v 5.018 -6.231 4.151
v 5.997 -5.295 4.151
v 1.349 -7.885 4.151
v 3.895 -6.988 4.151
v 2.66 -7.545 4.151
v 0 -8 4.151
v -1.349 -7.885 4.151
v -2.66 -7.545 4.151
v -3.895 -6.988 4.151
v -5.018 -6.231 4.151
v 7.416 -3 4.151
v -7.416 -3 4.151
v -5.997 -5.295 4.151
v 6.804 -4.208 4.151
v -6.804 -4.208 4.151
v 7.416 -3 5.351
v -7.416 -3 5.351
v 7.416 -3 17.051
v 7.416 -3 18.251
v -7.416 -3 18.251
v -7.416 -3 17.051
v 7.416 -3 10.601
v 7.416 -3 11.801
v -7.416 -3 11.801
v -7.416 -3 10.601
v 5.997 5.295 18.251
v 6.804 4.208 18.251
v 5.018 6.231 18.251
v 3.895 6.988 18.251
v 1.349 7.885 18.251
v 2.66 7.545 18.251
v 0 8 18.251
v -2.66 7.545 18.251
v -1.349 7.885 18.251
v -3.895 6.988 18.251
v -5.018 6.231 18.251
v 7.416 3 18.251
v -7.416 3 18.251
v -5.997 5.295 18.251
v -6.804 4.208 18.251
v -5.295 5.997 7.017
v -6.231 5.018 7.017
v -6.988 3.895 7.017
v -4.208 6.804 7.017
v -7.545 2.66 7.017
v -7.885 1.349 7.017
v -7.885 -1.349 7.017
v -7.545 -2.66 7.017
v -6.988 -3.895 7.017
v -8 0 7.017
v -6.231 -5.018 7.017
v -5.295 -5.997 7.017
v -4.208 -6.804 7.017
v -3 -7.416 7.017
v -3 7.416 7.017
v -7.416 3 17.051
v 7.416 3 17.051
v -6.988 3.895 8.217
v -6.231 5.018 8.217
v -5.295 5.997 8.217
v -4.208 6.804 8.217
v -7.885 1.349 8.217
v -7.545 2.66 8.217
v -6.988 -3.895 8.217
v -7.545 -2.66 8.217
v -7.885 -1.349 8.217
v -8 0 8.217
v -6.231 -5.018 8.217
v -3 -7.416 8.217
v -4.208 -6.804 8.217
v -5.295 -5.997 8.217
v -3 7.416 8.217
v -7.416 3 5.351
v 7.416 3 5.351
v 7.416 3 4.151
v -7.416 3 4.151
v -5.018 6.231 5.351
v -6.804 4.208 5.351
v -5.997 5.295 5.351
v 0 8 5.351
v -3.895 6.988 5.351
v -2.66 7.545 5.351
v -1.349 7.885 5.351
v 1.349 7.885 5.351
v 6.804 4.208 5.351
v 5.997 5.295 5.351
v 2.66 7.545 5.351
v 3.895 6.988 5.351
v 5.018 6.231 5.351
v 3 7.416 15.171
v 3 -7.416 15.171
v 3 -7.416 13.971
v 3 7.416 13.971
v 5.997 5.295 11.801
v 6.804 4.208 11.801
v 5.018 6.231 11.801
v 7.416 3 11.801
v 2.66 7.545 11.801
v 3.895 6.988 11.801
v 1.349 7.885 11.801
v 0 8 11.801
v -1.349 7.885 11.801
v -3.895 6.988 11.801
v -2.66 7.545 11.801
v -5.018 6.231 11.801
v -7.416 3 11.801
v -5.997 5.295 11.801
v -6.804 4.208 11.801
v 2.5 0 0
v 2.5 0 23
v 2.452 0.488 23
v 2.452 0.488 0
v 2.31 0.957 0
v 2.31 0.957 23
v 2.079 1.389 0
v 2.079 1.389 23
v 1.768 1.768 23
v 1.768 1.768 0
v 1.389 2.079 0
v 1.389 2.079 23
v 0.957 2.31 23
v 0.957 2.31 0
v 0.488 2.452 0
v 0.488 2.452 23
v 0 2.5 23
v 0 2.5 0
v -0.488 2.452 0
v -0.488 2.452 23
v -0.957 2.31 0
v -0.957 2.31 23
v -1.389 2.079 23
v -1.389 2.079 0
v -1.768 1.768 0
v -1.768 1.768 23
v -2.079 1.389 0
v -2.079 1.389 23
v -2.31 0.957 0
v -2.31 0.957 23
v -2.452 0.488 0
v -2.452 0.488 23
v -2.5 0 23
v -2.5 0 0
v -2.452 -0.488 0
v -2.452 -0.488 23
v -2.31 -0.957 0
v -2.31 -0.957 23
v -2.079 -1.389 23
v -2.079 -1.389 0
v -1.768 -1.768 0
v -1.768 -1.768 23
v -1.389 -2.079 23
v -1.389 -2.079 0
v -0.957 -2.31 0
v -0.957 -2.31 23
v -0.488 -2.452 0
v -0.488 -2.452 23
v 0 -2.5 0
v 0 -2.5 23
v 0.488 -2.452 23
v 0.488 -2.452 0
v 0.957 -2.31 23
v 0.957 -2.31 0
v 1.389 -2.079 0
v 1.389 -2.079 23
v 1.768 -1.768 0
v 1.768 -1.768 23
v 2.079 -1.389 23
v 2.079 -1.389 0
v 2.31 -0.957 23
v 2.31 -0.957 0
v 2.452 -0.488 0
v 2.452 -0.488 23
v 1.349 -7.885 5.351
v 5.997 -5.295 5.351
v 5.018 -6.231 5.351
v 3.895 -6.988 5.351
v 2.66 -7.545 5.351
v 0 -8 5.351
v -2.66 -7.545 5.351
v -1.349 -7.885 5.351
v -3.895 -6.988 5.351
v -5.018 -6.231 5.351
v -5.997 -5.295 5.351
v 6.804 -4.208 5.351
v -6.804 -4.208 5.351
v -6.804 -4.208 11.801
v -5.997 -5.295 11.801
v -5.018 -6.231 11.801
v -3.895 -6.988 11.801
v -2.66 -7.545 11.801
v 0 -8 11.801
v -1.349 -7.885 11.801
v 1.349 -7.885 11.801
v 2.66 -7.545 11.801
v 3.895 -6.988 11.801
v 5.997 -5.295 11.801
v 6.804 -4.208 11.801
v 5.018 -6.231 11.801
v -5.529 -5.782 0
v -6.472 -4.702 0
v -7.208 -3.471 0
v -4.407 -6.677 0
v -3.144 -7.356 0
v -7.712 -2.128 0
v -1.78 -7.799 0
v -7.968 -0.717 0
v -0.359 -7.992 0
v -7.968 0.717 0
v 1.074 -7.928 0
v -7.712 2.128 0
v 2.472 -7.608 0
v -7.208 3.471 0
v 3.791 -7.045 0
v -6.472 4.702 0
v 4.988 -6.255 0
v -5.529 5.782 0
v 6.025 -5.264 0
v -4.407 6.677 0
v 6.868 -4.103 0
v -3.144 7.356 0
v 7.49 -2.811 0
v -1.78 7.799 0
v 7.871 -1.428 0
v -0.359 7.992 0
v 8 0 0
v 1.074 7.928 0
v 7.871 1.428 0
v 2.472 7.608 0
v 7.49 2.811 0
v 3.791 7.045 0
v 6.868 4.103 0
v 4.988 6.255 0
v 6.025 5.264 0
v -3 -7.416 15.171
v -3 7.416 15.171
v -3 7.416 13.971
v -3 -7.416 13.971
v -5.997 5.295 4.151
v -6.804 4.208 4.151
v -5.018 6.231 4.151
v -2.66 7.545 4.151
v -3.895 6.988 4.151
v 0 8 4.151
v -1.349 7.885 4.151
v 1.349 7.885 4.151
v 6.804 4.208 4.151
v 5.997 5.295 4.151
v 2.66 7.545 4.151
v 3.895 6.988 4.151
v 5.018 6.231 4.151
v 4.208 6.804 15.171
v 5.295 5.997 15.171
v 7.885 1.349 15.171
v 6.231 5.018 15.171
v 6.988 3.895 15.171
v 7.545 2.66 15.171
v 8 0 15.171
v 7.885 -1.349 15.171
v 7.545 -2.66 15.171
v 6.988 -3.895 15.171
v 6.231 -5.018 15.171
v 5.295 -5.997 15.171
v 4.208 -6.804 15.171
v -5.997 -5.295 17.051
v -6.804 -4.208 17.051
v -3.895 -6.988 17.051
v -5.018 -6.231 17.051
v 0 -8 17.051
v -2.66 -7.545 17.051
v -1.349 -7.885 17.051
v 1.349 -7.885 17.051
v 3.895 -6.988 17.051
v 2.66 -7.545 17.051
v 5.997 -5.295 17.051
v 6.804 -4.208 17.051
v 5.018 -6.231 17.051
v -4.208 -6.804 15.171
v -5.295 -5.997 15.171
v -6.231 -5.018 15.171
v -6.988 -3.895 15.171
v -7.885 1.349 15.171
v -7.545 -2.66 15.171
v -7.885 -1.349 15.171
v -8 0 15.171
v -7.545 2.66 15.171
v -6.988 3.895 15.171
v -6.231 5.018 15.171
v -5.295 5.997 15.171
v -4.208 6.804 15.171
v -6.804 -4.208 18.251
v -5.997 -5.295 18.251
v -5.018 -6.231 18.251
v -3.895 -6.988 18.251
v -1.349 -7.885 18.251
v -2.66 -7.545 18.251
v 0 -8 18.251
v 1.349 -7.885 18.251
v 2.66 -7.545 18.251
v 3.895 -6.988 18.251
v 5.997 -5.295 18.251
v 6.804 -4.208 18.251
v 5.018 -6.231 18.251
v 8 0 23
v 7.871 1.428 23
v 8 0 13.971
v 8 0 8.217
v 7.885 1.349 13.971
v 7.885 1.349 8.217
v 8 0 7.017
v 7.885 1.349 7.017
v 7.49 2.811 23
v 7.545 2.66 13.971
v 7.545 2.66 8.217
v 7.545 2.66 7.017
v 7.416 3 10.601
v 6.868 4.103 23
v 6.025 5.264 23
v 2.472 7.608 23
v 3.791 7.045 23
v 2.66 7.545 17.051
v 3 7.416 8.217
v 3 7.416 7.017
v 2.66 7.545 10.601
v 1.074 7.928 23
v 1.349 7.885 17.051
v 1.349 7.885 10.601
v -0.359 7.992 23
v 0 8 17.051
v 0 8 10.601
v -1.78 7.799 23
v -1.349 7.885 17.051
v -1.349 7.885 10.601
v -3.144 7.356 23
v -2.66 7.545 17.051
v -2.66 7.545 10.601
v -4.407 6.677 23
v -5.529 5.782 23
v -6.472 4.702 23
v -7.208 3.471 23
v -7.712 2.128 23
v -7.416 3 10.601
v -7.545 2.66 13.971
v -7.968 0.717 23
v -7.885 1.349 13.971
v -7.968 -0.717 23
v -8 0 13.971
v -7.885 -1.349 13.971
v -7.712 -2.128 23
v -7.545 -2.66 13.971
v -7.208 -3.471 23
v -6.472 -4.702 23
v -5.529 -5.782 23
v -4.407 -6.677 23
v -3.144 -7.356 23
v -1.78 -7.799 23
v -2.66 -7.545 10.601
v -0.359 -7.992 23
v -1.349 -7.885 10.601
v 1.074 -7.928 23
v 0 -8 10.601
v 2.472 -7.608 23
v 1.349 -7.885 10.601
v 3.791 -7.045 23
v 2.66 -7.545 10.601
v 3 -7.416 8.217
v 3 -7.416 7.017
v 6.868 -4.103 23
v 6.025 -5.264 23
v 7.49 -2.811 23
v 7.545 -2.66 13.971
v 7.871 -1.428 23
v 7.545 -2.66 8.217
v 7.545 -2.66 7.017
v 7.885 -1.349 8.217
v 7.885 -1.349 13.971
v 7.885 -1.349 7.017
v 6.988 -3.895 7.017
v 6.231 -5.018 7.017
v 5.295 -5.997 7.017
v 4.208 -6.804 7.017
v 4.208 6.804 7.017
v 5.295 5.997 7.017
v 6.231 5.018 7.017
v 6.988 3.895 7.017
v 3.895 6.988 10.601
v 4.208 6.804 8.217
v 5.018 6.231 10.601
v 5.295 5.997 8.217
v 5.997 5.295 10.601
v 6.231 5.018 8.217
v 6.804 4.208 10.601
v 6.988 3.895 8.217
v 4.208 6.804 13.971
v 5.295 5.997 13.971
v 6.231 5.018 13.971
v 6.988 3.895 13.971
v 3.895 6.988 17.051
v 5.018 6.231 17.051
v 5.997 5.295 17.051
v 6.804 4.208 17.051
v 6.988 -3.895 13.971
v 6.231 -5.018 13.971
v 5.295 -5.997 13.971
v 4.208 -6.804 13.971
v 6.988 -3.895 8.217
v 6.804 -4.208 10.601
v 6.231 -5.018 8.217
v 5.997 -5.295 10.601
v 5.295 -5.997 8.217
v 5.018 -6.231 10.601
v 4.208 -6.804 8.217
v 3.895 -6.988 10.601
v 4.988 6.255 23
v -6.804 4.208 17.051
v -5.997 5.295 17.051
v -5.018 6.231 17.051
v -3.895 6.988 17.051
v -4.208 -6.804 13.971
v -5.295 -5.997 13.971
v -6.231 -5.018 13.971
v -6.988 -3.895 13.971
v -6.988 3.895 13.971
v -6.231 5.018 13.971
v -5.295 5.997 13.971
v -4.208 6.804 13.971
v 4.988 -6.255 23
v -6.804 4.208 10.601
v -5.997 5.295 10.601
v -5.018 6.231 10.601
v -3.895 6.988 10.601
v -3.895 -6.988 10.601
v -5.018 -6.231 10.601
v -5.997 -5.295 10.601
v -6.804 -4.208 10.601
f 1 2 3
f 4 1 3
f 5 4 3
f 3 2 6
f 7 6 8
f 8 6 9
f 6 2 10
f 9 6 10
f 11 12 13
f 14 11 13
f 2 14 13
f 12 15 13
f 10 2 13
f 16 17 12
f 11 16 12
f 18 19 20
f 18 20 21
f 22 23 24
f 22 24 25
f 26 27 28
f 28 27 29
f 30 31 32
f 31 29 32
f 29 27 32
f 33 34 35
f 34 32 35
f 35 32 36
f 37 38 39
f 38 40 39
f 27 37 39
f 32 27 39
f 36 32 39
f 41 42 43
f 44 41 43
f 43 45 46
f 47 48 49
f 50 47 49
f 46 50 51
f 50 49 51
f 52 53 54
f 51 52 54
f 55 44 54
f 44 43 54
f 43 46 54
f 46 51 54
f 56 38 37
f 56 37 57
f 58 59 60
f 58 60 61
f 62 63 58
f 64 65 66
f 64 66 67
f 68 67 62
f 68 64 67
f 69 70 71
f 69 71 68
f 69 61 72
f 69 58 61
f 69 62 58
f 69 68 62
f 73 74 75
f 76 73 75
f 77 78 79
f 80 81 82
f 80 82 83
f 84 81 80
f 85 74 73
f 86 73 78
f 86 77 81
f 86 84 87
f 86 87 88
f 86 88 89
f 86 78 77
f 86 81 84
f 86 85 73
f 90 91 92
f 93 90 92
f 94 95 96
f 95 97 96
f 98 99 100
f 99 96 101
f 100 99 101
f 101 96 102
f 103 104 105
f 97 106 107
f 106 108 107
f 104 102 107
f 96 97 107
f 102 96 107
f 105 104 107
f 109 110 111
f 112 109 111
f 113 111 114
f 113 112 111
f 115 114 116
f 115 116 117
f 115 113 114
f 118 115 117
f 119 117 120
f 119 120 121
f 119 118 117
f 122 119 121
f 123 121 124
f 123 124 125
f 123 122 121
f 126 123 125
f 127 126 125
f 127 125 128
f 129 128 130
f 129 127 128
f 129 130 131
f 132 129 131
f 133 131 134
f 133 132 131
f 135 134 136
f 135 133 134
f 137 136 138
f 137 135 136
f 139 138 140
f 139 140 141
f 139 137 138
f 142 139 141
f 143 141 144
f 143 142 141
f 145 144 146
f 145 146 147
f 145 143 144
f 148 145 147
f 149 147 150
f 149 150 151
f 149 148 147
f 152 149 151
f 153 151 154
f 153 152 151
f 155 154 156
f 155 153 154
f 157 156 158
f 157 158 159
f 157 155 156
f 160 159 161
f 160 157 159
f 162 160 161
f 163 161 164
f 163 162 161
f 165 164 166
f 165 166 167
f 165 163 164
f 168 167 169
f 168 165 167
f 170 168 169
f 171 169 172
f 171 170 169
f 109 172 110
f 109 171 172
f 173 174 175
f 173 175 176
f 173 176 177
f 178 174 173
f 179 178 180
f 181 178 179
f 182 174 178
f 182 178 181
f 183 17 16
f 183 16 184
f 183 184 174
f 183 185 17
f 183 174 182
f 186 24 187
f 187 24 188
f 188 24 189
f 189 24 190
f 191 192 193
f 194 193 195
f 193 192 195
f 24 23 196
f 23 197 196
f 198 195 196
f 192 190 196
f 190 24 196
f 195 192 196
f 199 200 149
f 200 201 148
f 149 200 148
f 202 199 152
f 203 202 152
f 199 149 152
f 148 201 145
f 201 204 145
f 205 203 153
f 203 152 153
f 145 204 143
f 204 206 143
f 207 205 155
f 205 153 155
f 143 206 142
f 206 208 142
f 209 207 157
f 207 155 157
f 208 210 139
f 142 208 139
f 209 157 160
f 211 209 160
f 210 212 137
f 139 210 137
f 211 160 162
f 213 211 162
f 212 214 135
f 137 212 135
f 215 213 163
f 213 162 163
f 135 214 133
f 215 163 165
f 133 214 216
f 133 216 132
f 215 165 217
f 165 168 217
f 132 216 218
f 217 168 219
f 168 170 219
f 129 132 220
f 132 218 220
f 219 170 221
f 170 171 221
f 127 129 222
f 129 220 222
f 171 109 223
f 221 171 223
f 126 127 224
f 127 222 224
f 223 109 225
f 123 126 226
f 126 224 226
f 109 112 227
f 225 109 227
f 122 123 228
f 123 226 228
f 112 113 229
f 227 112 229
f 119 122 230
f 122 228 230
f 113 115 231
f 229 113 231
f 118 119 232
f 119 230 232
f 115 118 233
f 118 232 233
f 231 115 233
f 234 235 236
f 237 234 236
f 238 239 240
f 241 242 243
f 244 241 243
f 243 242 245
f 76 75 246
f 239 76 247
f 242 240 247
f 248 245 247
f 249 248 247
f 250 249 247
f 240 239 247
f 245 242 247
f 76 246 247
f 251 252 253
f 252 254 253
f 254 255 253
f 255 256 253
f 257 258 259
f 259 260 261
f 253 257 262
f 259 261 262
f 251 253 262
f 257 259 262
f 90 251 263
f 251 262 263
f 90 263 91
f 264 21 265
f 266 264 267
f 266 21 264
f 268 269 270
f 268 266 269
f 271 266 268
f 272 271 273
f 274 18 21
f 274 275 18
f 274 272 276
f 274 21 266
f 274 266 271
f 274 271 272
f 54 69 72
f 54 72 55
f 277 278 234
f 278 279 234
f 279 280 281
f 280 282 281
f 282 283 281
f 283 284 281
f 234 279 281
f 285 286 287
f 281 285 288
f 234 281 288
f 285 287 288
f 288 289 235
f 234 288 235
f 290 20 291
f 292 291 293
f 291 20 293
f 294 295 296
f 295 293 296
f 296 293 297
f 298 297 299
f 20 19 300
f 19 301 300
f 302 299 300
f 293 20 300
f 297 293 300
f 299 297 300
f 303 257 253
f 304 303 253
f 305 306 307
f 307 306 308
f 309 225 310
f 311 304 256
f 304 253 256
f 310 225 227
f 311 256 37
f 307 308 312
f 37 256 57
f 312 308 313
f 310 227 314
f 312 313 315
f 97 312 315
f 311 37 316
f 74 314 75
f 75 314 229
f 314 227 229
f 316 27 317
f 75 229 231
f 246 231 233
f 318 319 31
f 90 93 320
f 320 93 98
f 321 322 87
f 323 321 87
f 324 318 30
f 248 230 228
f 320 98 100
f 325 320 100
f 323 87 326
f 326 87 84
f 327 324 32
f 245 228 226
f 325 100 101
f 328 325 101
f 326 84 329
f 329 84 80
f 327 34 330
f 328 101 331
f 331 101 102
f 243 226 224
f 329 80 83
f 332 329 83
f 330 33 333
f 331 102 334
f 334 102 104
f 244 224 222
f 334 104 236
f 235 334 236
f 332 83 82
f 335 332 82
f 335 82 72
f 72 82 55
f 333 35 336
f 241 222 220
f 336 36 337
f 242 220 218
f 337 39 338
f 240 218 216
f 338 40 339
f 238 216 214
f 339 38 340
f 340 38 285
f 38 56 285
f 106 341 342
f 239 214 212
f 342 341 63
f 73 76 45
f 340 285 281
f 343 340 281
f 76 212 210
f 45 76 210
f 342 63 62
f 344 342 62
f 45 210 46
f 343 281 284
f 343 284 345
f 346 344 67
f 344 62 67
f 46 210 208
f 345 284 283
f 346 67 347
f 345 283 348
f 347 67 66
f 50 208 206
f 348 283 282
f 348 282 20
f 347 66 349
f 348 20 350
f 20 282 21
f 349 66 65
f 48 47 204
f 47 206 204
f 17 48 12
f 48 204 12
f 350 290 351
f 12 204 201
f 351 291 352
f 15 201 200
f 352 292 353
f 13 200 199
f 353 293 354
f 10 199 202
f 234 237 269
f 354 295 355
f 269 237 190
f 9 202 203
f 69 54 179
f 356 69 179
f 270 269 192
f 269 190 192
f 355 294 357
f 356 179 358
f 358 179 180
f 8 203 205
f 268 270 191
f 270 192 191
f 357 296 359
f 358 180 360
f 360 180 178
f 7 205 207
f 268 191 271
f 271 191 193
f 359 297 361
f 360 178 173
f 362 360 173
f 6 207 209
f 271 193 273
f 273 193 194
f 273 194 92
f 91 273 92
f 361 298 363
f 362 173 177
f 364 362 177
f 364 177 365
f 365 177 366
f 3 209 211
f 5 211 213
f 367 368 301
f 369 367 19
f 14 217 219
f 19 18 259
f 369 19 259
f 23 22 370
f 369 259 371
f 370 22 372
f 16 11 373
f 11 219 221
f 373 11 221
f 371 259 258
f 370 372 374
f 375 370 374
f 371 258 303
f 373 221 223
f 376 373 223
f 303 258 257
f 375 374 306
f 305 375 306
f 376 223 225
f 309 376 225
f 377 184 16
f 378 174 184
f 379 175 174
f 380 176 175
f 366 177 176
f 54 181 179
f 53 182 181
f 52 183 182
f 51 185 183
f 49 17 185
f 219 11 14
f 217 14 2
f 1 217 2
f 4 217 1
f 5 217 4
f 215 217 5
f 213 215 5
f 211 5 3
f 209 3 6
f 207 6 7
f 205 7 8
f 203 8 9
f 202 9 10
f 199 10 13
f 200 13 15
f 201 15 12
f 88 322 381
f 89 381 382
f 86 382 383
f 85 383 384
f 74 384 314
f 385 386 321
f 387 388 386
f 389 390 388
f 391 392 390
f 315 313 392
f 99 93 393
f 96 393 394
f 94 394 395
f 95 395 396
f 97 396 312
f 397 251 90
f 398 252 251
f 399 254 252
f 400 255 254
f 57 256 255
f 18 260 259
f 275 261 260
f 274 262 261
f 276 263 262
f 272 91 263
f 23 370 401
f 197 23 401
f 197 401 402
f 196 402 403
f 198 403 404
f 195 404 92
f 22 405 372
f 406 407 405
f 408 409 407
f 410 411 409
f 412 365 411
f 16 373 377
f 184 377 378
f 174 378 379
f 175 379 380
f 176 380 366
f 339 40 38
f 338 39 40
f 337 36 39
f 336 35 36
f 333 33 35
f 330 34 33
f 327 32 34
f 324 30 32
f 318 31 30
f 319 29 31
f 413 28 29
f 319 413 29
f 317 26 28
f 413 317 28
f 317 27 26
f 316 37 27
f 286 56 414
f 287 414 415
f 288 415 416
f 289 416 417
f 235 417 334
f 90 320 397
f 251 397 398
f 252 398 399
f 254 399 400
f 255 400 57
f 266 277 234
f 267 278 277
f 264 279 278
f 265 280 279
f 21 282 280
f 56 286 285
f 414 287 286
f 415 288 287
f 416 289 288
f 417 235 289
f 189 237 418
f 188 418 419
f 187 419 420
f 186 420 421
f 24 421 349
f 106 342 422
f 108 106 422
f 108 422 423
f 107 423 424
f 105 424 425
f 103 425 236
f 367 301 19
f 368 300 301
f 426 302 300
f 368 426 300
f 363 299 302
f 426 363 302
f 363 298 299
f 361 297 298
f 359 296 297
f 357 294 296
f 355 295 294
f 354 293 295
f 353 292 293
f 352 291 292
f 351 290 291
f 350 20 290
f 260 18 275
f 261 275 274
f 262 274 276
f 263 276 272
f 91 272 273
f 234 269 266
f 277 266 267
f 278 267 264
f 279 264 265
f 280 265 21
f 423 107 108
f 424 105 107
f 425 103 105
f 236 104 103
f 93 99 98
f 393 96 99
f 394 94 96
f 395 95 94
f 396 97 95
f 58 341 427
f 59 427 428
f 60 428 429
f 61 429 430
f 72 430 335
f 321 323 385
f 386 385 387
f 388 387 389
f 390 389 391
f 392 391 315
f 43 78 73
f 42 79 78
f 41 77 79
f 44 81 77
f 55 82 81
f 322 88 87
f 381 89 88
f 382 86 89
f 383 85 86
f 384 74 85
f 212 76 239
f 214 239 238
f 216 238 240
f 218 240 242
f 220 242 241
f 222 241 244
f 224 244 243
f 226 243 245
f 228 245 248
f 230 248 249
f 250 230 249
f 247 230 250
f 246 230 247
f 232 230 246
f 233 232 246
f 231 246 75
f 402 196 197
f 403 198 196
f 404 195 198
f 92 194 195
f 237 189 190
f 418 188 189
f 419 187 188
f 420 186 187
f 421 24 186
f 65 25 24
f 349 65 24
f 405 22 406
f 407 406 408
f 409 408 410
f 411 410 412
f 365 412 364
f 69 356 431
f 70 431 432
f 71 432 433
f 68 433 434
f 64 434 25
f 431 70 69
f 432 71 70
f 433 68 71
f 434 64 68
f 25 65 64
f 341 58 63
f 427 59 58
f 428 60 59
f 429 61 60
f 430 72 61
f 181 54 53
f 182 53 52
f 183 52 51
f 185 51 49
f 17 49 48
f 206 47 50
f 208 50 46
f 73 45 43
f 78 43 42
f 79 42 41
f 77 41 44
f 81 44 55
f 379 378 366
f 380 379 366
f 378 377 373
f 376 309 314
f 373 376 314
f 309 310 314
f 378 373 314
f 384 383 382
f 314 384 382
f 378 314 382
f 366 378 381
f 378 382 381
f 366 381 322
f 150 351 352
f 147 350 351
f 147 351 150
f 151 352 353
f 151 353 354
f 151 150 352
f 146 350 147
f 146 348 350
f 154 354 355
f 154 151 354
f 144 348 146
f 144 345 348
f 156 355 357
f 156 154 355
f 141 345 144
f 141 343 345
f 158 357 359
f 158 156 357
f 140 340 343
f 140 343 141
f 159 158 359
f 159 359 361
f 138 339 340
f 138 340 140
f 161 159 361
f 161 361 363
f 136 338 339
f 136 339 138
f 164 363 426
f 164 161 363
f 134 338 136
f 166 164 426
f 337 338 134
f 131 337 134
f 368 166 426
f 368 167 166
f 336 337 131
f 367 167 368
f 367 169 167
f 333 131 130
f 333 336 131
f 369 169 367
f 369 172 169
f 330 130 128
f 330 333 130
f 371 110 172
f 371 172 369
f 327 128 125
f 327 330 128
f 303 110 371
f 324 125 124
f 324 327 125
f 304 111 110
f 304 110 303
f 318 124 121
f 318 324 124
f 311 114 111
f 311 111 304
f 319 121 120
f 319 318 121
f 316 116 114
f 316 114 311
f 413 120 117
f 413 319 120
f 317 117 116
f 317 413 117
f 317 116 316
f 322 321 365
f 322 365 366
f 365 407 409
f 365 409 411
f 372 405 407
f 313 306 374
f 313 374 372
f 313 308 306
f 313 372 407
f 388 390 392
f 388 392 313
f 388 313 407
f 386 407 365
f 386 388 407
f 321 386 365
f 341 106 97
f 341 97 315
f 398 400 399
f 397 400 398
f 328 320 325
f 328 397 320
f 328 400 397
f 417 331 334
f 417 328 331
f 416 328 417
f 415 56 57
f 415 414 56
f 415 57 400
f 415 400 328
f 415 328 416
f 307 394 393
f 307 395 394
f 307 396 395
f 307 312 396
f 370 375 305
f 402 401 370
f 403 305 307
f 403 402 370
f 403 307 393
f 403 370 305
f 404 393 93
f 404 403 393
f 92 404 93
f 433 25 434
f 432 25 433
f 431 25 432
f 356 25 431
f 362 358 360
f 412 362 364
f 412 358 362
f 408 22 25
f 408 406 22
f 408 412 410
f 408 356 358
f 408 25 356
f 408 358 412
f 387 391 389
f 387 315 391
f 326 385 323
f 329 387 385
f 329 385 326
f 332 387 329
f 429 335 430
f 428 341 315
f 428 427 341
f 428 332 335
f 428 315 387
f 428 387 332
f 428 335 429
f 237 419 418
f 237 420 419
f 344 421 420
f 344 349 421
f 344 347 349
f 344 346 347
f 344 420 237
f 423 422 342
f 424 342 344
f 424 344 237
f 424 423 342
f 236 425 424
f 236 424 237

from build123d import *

# Parameters (mm, degrees)
SKETCH1_R           = 8
SKETCH1_R_2         = 2.5
BOSS_EXTRUDE1_DEPTH = 23
SKETCH2_W           = 12.136901607
SKETCH2_H           = 1.2
SKETCH2_W_2         = 11.75463699
CUT_EXTRUDE1_DEPTH  = 9
CIRPATTERN1_COUNT   = 2
SKETCH3_W           = 1.2
SKETCH3_H           = 8.369278369
SKETCH3_H_2         = 8.338508964
SKETCH3_H_3         = 7.969276094
CUT_EXTRUDE2_DEPTH  = 9
CIRPATTERN2_COUNT   = 2


with BuildPart() as part:
    # Sketch1 → Boss-Extrude1 (new body)
    with BuildSketch(Plane.XY):
        Circle(SKETCH1_R)
        Circle(SKETCH1_R_2, mode=Mode.SUBTRACT)
    extrude(amount=BOSS_EXTRUDE1_DEPTH)

    # Sketch2 → Cut-Extrude1 (cut, symmetric)
    with BuildSketch(Plane(origin=(0, 0, 0), x_dir=(1, 0, 0), z_dir=(0, 1, 0))):
        with Locations((-9.068450803, -7.616722674)):
            Rectangle(SKETCH2_W, SKETCH2_H)
        with Locations((-8.877318495, -14.571215167)):
            Rectangle(SKETCH2_W_2, SKETCH2_H)
    cut_extrude1 = extrude(amount=CUT_EXTRUDE1_DEPTH, both=True, mode=Mode.SUBTRACT)

    # CirPattern1: Cut-Extrude1 ×2 about axis
    cirpattern1_axis = Axis((0, 0, 23), (0, 0, -1))
    for i in range(1, CIRPATTERN1_COUNT):
        add(cut_extrude1.rotate(cirpattern1_axis, i * 360 / CIRPATTERN1_COUNT), mode=Mode.SUBTRACT)

    # Sketch3 → Cut-Extrude2 (cut, symmetric)
    with BuildSketch(Plane(origin=(0, 0, 0), x_dir=(0, 0, -1), z_dir=(1, 0, 0))):
        with Locations((-11.201145593, 7.184639184)):
            Rectangle(SKETCH3_W, SKETCH3_H)
        with Locations((-17.65104418, 7.169254482)):
            Rectangle(SKETCH3_W, SKETCH3_H_2)
        with Locations((-4.751247006, 6.984638047)):
            Rectangle(SKETCH3_W, SKETCH3_H_3)
    cut_extrude2 = extrude(amount=CUT_EXTRUDE2_DEPTH, both=True, mode=Mode.SUBTRACT)

    # CirPattern2: Cut-Extrude2 ×2 about axis
    cirpattern2_axis = Axis((0, 0, 23), (0, 0, -1))
    for i in range(1, CIRPATTERN2_COUNT):
        add(cut_extrude2.rotate(cirpattern2_axis, i * 360 / CIRPATTERN2_COUNT), mode=Mode.SUBTRACT)


solid = part.part
